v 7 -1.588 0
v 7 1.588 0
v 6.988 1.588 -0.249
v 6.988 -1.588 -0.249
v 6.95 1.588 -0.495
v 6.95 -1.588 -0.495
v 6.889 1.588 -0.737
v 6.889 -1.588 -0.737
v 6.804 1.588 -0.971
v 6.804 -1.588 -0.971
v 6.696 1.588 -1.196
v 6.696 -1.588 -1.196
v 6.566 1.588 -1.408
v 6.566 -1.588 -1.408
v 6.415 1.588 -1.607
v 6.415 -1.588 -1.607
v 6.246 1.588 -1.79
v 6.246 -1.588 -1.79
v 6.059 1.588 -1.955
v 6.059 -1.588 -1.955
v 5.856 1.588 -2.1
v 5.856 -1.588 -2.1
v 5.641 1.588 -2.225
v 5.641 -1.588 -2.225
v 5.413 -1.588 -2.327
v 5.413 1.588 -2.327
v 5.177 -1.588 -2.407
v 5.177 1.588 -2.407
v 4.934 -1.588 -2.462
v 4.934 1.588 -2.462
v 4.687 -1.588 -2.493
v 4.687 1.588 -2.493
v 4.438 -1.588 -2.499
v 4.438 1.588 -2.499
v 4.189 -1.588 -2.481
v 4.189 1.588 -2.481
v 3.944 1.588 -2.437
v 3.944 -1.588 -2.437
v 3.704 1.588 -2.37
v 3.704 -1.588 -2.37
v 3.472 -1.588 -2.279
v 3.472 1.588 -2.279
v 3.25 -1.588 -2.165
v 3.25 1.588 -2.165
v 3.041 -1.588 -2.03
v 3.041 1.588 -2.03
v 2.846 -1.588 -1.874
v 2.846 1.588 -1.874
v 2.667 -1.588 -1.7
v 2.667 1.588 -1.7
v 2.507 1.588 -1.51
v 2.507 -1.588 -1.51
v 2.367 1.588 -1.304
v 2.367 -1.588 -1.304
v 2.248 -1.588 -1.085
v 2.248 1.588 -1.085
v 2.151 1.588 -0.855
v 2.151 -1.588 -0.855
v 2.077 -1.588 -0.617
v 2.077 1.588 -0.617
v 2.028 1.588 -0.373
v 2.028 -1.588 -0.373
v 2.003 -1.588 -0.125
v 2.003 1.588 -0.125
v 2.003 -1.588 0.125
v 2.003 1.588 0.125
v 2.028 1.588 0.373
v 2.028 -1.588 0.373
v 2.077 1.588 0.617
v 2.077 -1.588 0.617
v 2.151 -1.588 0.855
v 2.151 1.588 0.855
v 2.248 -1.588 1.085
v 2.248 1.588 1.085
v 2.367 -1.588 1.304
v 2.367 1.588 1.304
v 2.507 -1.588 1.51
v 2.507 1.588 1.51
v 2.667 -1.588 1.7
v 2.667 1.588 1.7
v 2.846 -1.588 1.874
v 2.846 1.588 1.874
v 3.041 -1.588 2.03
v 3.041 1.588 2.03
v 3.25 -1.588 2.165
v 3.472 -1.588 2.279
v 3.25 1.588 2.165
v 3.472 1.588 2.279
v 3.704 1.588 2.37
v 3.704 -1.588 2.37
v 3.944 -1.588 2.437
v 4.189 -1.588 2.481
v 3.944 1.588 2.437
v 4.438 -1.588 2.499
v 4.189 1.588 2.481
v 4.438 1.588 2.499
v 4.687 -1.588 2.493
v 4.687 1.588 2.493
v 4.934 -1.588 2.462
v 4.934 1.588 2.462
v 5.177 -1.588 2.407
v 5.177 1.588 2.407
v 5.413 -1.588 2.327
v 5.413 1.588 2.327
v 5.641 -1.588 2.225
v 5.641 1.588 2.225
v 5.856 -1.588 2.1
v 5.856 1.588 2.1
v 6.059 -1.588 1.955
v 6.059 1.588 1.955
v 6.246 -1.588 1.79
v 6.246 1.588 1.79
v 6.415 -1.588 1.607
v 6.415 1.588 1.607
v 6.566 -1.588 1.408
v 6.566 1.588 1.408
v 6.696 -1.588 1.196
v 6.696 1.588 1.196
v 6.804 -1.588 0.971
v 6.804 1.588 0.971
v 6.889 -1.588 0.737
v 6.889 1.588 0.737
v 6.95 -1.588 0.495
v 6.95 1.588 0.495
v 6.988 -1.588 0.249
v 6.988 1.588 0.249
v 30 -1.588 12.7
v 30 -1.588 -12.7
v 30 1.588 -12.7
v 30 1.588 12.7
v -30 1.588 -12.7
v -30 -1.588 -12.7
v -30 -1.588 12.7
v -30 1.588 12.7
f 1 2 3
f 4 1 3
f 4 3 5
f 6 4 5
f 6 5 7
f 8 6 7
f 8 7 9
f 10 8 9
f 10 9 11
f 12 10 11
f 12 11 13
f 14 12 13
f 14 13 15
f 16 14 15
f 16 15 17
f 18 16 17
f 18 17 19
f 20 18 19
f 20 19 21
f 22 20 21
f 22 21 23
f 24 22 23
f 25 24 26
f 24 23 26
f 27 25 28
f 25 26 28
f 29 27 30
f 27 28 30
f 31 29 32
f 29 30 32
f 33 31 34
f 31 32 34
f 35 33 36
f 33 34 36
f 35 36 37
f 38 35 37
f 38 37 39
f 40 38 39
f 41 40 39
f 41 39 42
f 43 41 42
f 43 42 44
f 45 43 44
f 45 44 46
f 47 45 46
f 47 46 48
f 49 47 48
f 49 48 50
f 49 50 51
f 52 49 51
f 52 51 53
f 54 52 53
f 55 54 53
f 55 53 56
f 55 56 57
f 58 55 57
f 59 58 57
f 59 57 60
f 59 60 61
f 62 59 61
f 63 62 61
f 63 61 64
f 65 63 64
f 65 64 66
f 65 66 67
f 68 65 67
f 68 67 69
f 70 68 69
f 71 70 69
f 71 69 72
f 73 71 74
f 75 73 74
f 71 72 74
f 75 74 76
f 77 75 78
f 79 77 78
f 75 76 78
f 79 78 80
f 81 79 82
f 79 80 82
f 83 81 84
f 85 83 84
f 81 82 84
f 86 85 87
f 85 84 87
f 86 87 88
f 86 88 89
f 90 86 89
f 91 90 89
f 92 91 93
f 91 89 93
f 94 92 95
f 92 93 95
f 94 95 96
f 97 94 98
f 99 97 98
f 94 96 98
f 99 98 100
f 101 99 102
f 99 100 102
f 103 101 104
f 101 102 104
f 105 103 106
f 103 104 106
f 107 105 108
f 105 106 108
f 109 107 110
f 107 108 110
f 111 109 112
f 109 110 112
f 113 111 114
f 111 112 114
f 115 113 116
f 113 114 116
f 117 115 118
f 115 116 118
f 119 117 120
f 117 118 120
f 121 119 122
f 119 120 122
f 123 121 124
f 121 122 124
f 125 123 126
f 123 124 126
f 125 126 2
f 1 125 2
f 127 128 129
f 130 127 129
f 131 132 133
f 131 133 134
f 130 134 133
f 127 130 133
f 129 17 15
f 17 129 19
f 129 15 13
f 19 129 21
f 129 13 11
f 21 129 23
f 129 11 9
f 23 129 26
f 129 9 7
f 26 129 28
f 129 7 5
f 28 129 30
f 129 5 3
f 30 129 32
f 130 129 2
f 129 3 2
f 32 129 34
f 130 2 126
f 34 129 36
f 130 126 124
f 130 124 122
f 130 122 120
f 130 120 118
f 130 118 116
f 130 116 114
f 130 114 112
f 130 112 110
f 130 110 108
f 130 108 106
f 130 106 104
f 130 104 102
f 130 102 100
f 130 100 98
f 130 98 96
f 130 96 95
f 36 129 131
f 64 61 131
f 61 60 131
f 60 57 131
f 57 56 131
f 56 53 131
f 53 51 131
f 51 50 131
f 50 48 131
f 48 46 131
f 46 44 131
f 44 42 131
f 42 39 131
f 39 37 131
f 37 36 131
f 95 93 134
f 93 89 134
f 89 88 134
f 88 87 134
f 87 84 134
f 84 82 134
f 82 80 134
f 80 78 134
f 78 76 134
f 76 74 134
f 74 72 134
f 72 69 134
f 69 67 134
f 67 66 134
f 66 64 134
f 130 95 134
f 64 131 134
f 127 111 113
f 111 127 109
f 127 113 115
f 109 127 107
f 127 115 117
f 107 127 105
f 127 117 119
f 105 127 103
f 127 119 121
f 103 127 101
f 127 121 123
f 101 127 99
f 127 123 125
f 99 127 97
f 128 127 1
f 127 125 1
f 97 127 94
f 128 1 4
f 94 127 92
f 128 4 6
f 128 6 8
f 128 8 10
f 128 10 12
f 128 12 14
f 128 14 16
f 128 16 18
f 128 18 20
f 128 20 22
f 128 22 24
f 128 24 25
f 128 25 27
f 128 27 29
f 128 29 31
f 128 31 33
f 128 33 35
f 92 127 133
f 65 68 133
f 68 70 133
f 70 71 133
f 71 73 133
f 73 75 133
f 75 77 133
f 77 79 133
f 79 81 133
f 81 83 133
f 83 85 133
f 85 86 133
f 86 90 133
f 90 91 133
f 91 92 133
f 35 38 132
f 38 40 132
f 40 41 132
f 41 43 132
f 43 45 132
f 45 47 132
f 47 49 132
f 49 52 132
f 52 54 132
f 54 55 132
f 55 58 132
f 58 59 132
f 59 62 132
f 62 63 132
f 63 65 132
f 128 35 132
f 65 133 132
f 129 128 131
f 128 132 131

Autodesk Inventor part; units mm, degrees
ref_plane "YZ Plane" through (0, 0, 0) normal (1, 0, 0) x (0, 1, 0)
ref_plane "XZ Plane" through (0, 0, 0) normal (0, 1, 0) x (-1, 0, 0)
ref_plane "XY Plane" through (0, 0, 0) normal (0, 0, 1) x (1, 0, 0)
sketch "Sketch1" plane through (0, 0, 0) normal (1, 0, 0) x (0, 1, 0)
  line L0 (1.5875, 12.7) -> (-1.5875, 12.7)
  line L1 (-1.5875, 12.7) -> (-1.5875, -12.7)
  line L2 (-1.5875, -12.7) -> (1.5875, -12.7)
  line L3 (1.5875, -12.7) -> (1.5875, 12.7)
  line L4 (1.5875, 12.7) -> (-1.5875, -12.7) construction
  line L5 (-1.5875, 12.7) -> (1.5875, -12.7) construction
  point P0 (0, 0)
  dimension "d0" = 3.175
  dimension "d1" = 25.4
extrude "Extrusion1" add sketch "Sketch1" along normal mid plane 60
sketch "Sketch2" plane through (-30, 1.5875, 12.7) normal (0, 1, 0) x (1, 0, 0)
  line L0 (0, 0) -> (0, 25.4) projected
  line L1 (0, 12.7) -> (34.5, 12.7)
  line L2 (34.5, 12.7) -> (254.5, 12.7)
  circle A0 centre (34.5, 12.7) radius 2.5
  circle A1 centre (254.5, 12.7) radius 2.5
  point P0 (30, 12.7)
  dimension "d4" = 34.5
  dimension "d5" = 220
  dimension "d6" = 5
  dimension "d7" = 5
extrude "Extrusion2" cut sketch "Sketch2" against normal blind 250 contours A0 L2 L1 | L1 L2 A0
properties part number "PLETINA PARA CARA INCLINADA"
